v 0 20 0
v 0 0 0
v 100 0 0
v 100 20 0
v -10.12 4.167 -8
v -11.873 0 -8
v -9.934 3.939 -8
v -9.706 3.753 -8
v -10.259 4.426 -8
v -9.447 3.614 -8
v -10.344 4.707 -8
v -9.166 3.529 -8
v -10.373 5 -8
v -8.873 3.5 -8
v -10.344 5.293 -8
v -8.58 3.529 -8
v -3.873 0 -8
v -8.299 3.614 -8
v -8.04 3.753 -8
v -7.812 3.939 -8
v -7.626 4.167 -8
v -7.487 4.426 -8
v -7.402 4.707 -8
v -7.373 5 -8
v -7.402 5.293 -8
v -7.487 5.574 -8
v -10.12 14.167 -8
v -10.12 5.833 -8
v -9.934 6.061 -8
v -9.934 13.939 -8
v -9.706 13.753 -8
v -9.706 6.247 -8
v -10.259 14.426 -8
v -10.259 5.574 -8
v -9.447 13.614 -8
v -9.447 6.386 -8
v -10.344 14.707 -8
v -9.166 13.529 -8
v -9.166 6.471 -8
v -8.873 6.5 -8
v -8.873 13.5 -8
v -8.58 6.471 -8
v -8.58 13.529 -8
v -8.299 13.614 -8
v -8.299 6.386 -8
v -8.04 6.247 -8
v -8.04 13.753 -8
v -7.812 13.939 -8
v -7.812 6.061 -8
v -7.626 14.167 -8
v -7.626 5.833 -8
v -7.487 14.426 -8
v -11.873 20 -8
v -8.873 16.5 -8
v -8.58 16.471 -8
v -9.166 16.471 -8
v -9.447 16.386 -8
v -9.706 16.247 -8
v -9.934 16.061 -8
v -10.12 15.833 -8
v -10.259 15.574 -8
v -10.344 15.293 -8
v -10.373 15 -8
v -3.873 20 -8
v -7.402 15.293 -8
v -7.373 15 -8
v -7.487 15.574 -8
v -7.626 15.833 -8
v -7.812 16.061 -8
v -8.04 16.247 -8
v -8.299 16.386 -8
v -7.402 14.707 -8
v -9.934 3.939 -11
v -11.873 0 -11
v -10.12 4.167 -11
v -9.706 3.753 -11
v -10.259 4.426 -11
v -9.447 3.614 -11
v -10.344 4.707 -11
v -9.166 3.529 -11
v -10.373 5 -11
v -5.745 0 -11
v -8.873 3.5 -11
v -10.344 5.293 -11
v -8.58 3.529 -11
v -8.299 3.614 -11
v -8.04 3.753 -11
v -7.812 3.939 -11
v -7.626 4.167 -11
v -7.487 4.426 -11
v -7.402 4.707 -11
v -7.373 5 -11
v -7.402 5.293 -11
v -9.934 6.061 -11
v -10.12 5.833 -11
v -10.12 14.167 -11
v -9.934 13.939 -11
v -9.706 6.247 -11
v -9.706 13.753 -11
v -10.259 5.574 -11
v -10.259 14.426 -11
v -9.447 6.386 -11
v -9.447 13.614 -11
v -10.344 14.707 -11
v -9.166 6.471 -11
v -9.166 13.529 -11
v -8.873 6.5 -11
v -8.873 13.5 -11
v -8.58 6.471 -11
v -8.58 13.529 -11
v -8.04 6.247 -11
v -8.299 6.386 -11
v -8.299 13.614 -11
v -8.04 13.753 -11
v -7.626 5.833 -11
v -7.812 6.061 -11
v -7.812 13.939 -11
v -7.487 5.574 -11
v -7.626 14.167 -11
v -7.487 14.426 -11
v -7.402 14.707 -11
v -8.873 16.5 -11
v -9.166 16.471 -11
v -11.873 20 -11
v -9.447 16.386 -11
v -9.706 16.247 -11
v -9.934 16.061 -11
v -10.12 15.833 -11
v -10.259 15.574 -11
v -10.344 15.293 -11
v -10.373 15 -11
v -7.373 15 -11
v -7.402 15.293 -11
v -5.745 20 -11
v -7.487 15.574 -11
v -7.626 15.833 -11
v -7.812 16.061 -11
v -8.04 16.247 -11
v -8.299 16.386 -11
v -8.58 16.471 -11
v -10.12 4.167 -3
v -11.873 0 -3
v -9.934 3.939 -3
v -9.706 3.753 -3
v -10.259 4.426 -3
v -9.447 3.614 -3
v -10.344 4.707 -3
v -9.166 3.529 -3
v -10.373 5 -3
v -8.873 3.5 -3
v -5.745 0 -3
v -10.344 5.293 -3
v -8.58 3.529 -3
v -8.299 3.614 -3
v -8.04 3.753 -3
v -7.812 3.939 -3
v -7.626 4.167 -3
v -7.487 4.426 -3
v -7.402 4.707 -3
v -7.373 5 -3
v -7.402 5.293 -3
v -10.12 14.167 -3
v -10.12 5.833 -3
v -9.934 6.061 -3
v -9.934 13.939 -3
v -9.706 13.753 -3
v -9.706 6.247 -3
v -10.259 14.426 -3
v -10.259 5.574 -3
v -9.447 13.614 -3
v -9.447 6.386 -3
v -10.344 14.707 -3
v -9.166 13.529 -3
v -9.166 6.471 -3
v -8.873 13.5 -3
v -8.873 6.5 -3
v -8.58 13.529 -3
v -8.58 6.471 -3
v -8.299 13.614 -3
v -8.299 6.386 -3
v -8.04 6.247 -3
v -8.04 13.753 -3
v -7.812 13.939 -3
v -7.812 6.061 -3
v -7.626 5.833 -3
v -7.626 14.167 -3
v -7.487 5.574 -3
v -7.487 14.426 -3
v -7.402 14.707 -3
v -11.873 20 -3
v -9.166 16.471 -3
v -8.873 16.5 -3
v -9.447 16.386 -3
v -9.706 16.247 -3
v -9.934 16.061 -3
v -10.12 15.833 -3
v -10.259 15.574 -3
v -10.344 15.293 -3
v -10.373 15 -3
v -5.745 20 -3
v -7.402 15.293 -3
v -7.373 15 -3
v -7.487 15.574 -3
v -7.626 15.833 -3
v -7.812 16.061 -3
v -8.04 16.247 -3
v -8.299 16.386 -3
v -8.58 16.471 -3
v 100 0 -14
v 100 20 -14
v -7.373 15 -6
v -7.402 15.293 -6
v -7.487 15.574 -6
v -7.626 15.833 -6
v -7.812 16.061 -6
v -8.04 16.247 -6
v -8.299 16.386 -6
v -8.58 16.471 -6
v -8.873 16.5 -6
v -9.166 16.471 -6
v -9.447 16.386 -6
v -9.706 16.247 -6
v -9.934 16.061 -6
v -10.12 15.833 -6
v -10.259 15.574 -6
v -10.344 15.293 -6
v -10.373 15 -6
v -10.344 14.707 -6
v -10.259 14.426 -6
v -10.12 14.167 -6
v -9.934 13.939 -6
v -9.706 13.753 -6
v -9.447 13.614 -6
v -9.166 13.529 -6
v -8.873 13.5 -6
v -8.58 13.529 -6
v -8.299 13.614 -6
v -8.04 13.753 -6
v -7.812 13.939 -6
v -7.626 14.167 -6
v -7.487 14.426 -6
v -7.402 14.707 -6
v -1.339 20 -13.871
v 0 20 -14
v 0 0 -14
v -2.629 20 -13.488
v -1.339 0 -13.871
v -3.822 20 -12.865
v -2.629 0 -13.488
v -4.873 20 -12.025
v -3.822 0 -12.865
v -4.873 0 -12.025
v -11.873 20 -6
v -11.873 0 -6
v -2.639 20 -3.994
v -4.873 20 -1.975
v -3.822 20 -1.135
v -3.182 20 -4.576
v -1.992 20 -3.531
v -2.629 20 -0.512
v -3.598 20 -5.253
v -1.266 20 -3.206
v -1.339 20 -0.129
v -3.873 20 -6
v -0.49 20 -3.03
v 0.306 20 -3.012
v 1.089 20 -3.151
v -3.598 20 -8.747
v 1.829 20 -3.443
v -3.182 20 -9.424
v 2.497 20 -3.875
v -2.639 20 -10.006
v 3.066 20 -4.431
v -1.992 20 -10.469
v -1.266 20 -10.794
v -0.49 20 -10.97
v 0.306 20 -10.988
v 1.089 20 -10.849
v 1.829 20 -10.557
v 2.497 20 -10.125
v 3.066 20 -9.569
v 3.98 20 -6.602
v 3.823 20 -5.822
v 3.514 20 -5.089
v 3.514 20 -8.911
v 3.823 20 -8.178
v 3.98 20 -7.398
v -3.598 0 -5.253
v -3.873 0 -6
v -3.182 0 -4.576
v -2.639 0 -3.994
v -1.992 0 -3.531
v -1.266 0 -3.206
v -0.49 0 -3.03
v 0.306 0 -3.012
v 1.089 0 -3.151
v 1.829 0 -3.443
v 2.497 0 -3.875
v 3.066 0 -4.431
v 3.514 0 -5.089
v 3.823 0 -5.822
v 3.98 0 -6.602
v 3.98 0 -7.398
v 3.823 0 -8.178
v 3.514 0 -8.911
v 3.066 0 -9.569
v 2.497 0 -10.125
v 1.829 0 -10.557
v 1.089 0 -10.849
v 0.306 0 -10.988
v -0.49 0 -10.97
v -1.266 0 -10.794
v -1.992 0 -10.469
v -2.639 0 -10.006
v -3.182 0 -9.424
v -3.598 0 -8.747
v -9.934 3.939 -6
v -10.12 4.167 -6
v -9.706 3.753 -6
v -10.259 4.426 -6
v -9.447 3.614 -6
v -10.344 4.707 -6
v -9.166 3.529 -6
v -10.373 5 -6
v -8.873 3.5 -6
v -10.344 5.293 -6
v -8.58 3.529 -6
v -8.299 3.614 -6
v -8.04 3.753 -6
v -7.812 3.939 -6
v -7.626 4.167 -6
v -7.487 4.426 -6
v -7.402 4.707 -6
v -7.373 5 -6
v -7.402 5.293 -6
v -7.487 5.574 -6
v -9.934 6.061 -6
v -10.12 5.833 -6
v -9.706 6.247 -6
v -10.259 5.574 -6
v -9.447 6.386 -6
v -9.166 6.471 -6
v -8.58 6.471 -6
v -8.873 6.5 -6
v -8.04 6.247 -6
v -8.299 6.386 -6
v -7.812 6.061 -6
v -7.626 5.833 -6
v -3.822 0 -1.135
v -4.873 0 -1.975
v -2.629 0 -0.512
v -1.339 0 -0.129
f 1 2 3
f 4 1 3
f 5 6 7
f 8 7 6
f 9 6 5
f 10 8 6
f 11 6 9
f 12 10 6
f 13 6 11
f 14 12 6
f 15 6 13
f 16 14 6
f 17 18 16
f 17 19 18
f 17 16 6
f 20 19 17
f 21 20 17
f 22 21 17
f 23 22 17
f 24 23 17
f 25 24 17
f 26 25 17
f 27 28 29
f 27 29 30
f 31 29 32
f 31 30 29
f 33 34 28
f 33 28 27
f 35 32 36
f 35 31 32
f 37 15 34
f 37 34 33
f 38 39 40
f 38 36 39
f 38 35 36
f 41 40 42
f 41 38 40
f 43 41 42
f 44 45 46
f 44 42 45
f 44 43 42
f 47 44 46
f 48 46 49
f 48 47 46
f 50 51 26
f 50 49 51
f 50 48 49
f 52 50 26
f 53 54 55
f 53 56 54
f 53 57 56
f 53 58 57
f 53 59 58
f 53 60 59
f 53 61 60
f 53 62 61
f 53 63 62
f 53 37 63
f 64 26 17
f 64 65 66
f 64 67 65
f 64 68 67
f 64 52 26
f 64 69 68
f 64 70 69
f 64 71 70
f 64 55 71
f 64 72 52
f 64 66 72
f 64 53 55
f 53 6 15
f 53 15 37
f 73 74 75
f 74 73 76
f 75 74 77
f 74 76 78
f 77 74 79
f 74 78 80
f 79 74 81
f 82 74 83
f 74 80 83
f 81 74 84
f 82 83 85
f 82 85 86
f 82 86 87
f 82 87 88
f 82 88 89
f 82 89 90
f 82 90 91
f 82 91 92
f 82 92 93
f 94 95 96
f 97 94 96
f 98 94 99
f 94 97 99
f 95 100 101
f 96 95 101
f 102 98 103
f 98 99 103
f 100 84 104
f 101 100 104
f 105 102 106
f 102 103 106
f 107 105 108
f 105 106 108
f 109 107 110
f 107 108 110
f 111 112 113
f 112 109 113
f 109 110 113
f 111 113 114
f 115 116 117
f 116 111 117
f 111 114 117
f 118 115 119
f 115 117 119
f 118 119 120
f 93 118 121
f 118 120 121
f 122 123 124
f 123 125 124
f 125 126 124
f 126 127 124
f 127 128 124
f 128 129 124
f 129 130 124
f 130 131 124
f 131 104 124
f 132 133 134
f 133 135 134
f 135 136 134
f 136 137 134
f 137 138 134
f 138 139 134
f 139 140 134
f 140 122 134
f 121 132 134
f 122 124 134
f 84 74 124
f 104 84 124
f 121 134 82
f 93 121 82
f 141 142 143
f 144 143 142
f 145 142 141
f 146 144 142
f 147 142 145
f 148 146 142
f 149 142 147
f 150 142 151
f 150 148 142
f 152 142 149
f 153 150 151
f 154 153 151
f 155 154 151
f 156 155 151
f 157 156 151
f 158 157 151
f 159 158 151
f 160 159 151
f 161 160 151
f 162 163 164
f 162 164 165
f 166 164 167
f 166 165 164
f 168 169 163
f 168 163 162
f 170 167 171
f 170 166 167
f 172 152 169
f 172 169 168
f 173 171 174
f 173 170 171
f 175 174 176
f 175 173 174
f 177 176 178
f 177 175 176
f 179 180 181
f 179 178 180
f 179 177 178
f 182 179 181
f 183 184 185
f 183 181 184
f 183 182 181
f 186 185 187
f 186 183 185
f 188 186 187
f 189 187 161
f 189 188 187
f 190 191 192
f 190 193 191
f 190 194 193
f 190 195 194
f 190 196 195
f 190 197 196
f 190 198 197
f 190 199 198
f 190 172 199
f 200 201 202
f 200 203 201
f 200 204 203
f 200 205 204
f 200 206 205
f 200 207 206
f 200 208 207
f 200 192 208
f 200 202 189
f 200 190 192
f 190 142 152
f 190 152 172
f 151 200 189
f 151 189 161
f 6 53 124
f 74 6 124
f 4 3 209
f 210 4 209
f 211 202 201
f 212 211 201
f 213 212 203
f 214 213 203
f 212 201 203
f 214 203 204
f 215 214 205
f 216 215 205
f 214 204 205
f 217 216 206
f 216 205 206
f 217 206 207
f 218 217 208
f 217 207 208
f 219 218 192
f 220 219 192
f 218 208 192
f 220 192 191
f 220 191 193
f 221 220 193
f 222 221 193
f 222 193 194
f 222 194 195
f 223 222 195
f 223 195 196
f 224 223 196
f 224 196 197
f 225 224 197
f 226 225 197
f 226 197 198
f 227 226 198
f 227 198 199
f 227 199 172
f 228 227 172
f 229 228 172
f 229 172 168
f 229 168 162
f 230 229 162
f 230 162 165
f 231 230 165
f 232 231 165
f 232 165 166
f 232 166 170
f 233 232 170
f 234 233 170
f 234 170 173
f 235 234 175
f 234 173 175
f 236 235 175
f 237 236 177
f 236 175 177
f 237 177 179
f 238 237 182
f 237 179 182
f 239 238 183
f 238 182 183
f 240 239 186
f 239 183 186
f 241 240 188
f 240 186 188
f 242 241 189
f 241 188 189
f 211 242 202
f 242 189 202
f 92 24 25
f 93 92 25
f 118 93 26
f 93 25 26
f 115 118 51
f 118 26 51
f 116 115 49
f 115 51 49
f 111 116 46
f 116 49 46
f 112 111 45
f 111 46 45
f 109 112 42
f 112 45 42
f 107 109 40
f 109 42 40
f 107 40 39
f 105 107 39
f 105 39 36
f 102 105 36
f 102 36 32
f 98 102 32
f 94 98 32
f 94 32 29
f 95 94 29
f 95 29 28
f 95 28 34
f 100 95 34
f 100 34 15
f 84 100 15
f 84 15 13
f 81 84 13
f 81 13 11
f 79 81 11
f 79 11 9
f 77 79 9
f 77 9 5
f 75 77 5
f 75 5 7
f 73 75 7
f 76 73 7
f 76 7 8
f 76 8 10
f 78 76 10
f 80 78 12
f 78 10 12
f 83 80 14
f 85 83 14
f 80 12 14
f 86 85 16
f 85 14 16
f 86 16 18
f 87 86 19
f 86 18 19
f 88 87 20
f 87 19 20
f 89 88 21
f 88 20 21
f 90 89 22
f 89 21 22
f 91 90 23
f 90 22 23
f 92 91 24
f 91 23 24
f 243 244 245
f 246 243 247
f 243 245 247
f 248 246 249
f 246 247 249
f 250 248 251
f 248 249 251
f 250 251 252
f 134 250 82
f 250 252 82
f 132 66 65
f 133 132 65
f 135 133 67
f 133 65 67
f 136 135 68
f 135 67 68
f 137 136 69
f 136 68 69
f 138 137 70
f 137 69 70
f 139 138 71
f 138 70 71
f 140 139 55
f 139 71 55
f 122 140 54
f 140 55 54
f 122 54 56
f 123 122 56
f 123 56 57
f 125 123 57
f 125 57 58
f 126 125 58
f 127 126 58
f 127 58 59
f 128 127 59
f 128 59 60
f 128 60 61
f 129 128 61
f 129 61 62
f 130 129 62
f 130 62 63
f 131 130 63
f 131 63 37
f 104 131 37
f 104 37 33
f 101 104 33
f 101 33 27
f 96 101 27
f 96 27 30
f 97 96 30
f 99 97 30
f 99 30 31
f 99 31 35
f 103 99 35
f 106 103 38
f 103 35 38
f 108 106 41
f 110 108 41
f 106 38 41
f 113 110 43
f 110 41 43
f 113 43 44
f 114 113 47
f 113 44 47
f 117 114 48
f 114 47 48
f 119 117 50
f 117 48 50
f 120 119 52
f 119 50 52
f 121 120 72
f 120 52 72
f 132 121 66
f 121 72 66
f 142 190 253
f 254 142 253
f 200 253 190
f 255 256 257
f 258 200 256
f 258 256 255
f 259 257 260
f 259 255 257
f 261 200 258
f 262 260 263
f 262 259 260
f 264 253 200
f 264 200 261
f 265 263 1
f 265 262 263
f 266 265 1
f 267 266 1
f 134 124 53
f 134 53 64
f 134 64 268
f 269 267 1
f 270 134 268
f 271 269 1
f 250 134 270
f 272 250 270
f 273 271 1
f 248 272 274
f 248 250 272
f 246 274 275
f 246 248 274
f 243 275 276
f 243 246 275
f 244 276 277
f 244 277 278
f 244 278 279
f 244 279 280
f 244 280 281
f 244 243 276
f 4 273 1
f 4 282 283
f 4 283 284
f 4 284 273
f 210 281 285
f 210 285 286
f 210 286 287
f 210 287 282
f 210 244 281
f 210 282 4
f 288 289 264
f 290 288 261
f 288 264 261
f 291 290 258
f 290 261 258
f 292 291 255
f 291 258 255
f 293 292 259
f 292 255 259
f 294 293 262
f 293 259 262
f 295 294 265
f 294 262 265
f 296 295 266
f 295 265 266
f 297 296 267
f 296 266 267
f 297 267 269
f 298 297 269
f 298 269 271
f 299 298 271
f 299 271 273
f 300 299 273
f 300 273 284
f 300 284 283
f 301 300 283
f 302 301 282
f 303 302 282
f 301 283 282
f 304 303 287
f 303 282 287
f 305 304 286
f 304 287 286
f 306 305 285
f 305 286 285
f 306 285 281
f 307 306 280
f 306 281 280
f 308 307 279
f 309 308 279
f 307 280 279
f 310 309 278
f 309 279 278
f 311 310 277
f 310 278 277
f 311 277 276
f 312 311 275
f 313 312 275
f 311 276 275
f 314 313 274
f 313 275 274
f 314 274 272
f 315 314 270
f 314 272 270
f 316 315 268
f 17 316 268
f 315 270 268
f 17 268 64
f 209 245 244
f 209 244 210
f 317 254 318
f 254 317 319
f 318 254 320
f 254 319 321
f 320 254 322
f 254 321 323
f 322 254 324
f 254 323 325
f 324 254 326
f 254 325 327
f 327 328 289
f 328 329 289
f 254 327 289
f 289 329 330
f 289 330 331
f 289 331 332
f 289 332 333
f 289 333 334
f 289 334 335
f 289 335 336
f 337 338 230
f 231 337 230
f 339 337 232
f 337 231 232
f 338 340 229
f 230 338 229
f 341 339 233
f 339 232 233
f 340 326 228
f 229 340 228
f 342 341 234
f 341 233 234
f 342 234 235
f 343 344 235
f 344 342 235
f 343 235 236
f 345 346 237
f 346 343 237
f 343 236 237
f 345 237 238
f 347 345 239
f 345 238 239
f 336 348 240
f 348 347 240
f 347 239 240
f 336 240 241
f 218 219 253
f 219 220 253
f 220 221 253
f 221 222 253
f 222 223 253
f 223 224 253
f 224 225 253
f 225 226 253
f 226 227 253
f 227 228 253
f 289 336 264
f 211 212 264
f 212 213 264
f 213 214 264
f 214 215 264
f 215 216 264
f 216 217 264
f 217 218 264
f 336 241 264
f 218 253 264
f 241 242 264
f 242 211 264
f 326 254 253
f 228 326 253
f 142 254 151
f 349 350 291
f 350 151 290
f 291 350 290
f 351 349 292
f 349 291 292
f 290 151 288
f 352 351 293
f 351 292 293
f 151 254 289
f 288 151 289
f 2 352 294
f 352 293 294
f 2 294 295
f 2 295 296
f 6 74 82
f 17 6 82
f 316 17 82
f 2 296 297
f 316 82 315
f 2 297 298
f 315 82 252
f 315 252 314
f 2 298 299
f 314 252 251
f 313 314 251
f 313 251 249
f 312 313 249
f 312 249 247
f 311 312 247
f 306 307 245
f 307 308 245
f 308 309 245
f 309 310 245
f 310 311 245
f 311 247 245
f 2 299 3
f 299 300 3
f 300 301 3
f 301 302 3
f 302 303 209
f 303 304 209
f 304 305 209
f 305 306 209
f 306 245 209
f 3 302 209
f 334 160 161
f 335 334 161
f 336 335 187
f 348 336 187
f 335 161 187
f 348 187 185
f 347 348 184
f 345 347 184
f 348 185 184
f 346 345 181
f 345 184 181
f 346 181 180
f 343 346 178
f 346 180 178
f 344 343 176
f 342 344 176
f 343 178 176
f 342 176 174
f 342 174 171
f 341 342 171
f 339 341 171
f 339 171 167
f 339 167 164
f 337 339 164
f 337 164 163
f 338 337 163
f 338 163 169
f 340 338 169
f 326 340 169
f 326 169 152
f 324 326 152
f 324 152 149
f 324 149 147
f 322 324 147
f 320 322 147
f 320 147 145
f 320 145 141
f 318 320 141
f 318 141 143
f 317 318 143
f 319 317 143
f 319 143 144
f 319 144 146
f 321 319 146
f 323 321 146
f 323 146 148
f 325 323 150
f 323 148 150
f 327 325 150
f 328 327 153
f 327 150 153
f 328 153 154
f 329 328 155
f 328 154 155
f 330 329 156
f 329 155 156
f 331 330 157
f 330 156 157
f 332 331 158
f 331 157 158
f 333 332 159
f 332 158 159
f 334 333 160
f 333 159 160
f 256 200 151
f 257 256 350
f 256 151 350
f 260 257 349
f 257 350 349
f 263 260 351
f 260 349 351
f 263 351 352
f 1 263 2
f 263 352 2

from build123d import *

# Parameters (mm, degrees)
ESBO_O1_R                = 7
ESBO_O1_W                = 100
ESBO_O1_H                = 14
RESSALTO_EXTRUS_O1_DEPTH = 20
ESBO_O2_R                = 4
CORTE_EXTRUS_O1_DEPTH    = 20
ESBO_O3_W                = 10
ESBO_O3_H                = 2
CORTE_EXTRUS_O2_DEPTH    = 20
ESBO_O4_W                = 8
ESBO_O4_H                = 3
RESSALTO_EXTRUS_O2_DEPTH = 20
ESBO_O5_R                = 1.5
CORTE_EXTRUS_O3_DEPTH    = 20


with BuildPart() as part:
    # Esboço1 → Ressalto-extrusão1 (new body)
    with BuildSketch(Plane(origin=(0, 0, 0), x_dir=(1, 0, 0), z_dir=(0, 1, 0))):
        with Locations((0, 7)):
            Circle(ESBO_O1_R)
        with Locations((50, 7)):
            Rectangle(ESBO_O1_W, ESBO_O1_H)
    extrude(amount=RESSALTO_EXTRUS_O1_DEPTH)

    # Esboço2 → Corte-extrusão1 (cut)
    with BuildSketch(Plane(origin=(0, 20, 0), x_dir=(1, 0, 0), z_dir=(0, 1, 0))):
        with Locations(Location((0, 7, 0), (0, 0, 270))):
            Circle(ESBO_O2_R)
    extrude(amount=-CORTE_EXTRUS_O1_DEPTH, mode=Mode.SUBTRACT)

    # Esboço3 → Corte-extrusão2 (cut)
    with BuildSketch(Plane(origin=(0, 20, 0), x_dir=(1, 0, 0), z_dir=(0, 1, 0))):
        with Locations((-4, 7)):
            Rectangle(ESBO_O3_W, ESBO_O3_H)
    extrude(amount=-CORTE_EXTRUS_O2_DEPTH, mode=Mode.SUBTRACT)

    # Esboço4 → Ressalto-extrusão2 (add)
    with BuildSketch(Plane(origin=(0, 20, 0), x_dir=(1, 0, 0), z_dir=(0, 1, 0))):
        with Locations((-7.872983346, 9.5)):
            Rectangle(ESBO_O4_W, ESBO_O4_H)
        with Locations((-7.872983346, 4.5)):
            Rectangle(ESBO_O4_W, ESBO_O4_H)
    extrude(amount=-RESSALTO_EXTRUS_O2_DEPTH)

    # Esboço5 → Corte-extrusão3 (cut)
    with BuildSketch(Plane.XY.offset(-3)):
        with Locations((-8.872983346, 15)):
            Circle(ESBO_O5_R)
        with Locations((-8.872983346, 5)):
            Circle(ESBO_O5_R)
    extrude(amount=-CORTE_EXTRUS_O3_DEPTH, mode=Mode.SUBTRACT)


solid = part.part
